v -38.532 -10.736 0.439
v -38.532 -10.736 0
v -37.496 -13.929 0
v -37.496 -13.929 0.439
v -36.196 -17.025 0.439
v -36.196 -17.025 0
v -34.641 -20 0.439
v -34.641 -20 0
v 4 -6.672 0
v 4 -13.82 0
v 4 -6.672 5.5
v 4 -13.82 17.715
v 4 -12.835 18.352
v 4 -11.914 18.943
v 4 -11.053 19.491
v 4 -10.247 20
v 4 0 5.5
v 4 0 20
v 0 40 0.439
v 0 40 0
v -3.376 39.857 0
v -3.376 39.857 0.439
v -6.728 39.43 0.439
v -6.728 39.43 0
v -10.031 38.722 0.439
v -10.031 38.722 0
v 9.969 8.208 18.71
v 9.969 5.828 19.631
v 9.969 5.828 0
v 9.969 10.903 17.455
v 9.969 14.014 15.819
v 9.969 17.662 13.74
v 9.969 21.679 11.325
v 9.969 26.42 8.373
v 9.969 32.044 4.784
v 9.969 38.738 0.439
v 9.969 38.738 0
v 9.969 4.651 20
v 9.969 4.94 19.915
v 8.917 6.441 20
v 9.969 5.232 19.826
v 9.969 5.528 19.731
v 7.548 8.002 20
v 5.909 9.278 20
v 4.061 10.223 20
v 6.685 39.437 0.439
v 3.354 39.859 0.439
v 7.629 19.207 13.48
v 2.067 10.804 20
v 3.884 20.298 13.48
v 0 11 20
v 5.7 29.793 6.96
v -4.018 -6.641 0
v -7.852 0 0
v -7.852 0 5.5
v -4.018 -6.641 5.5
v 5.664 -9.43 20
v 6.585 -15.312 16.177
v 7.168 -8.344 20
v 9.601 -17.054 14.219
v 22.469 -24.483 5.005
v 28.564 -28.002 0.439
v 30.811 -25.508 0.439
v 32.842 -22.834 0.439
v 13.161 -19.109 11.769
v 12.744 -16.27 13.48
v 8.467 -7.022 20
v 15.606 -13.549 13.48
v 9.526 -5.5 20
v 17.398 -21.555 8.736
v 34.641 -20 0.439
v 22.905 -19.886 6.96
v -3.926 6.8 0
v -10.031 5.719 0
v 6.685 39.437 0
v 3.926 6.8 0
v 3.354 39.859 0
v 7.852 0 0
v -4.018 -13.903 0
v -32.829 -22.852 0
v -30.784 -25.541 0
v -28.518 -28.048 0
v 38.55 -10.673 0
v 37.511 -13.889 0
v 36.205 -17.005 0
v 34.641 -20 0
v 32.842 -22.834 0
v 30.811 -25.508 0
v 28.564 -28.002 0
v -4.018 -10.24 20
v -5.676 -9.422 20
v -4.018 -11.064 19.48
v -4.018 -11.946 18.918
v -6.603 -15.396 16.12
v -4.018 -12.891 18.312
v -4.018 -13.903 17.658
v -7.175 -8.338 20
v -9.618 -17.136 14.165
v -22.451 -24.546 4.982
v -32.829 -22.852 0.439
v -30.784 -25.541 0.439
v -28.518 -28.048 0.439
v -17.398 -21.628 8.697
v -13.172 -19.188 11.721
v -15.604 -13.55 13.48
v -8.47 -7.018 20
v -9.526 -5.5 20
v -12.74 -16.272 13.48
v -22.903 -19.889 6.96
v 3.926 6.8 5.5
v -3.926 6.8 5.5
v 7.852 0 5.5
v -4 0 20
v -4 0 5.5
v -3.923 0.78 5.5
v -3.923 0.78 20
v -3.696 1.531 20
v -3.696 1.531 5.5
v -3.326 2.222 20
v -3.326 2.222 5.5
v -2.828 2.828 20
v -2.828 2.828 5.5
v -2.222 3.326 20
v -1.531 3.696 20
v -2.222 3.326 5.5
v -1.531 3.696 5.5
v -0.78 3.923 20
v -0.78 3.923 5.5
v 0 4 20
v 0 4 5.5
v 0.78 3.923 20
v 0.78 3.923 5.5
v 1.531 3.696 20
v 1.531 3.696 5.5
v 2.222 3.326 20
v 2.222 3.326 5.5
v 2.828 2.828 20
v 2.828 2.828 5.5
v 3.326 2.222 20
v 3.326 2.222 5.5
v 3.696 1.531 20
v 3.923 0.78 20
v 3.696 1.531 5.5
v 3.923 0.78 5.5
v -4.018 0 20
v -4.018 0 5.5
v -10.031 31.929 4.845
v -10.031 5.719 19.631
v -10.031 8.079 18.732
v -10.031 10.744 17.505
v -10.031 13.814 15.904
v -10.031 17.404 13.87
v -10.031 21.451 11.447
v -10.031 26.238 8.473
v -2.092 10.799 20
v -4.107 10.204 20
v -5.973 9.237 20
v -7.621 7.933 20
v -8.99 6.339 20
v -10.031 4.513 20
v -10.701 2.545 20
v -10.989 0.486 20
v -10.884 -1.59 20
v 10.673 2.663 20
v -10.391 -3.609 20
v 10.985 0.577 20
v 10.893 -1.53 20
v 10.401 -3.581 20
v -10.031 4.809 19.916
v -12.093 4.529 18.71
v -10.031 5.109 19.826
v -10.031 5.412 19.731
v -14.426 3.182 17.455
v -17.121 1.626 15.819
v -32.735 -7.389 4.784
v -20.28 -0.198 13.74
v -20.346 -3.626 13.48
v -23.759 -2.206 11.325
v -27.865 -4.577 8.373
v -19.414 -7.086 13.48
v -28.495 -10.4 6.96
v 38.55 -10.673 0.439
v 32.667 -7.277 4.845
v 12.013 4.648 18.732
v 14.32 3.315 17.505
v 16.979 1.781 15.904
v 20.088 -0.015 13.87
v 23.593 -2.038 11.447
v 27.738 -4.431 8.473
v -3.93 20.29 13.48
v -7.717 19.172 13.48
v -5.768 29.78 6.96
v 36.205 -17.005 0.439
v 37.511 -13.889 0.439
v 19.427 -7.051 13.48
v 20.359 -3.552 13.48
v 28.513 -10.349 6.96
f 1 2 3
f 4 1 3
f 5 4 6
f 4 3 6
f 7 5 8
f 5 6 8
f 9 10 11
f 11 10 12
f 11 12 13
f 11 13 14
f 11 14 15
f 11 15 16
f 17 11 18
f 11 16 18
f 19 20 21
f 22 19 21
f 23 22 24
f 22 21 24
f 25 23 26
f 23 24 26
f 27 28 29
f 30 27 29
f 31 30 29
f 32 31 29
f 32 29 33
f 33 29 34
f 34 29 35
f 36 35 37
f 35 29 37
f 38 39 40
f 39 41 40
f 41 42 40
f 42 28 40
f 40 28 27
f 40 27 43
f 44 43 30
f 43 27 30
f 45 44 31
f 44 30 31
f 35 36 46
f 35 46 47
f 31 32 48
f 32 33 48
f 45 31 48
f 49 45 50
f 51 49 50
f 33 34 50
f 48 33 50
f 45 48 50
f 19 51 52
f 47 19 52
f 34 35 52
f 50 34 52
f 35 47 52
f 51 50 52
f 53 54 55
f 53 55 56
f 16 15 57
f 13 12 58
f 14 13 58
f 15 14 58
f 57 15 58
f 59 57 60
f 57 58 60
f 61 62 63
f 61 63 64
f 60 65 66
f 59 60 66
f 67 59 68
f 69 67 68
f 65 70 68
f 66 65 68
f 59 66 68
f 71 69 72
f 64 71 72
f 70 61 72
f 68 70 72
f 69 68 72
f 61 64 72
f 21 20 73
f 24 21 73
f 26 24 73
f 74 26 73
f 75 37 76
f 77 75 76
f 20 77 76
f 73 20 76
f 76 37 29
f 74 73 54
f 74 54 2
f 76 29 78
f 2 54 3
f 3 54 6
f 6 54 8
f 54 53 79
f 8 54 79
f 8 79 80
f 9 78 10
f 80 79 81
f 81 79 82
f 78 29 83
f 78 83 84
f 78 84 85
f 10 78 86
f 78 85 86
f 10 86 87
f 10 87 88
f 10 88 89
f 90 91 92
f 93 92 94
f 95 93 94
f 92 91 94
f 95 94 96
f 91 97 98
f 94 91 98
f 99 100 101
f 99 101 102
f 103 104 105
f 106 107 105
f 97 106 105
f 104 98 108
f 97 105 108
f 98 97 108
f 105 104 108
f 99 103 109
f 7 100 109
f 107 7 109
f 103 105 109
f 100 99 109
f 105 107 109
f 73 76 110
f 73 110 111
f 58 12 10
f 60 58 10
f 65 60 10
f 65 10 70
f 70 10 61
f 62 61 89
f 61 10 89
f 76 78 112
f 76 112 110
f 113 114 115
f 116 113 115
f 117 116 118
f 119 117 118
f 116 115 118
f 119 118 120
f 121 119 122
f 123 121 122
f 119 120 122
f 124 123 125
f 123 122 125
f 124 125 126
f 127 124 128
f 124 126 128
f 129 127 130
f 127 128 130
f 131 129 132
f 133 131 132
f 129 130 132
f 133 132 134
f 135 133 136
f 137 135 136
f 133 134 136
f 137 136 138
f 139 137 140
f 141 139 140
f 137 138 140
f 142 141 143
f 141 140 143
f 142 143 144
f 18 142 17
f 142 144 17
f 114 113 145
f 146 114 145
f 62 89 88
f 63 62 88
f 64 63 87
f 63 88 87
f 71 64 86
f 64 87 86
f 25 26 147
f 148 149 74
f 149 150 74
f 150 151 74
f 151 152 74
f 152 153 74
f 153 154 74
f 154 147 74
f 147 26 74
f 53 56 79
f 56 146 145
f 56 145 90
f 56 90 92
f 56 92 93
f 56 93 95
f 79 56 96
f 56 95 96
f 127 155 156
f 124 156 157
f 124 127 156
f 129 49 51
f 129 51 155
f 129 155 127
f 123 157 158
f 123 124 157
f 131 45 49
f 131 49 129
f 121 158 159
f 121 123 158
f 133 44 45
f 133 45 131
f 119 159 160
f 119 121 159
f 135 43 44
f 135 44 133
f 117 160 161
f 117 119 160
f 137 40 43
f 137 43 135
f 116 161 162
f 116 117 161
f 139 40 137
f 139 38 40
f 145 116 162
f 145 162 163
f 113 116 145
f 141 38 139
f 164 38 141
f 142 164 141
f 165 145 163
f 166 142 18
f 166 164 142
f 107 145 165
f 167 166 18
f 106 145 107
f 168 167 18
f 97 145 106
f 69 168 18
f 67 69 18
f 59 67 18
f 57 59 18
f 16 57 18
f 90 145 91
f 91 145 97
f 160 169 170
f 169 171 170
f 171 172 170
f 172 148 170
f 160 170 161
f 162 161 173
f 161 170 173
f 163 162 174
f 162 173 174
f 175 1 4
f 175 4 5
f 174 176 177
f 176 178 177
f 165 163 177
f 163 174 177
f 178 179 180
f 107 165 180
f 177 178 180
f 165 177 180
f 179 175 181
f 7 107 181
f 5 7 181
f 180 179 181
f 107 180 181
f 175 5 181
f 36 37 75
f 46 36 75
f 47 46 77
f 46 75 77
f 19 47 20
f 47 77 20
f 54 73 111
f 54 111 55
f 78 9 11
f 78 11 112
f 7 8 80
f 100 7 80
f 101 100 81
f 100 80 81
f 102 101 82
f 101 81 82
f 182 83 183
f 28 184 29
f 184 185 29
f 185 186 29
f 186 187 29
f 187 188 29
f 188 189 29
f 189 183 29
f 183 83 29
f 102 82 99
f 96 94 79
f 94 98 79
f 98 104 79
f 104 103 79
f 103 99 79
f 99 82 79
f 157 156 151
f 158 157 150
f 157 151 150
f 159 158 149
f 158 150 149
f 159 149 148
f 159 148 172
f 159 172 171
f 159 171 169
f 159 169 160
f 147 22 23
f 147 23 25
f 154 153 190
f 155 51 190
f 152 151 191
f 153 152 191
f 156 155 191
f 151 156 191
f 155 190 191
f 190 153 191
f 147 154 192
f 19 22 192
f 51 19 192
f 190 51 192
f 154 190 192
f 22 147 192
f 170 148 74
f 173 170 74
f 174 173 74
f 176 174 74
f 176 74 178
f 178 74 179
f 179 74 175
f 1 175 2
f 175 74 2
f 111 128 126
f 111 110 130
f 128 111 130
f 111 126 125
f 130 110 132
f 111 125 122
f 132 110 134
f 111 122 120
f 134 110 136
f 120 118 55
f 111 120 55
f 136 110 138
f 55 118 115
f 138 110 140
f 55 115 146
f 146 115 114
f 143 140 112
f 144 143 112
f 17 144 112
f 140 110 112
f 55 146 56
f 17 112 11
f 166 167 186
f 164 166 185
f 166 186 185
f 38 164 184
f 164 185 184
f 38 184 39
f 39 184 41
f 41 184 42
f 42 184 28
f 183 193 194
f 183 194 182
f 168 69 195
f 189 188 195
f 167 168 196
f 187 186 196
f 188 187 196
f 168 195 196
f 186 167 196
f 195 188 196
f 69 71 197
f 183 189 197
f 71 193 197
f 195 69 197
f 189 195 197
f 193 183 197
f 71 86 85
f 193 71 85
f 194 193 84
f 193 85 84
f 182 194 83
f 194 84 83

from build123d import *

# Parameters (mm, degrees)
F1_DEPTH = 20
F2_DEPTH = 5.5
F3_SIZE2 = 19.5607469884
F3_SIZE  = 29
F4_COUNT = 3
F6_DEPTH = 20


with BuildPart() as f1:
    # F0 (on Top) → F1 (new body)
    with BuildSketch(Plane.XY):
        with BuildLine():
            ThreePointArc((-4, 0), (0, 4), (4, 0))
            Line((4, 0), (7.851963661, 0))
            Line((7.851963661, 0), (3.9259818305, 6.8))
            Line((3.9259818305, 6.8), (-3.9259818305, 6.8))
            Line((-3.9259818305, 6.8), (-7.851963661, 0))
            Line((-7.851963661, 0), (-4, 0))
        make_face()
        with BuildLine():
            Line((3.9259818305, 6.8), (7.851963661, 0))
            Line((7.851963661, 0), (9.96856343, 0))
            Line((9.96856343, 0), (9.96856343, 38.7379367435))
            ThreePointArc((9.96856343, 38.7379367435), (5.024068581, 39.6832298949), (-4.8e-09, 40))
            ThreePointArc((-4.8e-09, 40), (-5.0562773626, 39.6791388419), (-10.03143657, 38.7217029628))
            Line((-10.03143657, 38.7217029628), (-10.03143657, 0))
            Line((-10.03143657, 0), (-7.851963661, 0))
            Line((-7.851963661, 0), (-3.9259818305, 6.8))
            Line((-3.9259818305, 6.8), (3.9259818305, 6.8))
        make_face()
    extrude(amount=F1_DEPTH)

    # F0 (on Top) → F2 (cut)
    with BuildSketch(Plane.XY):
        with BuildLine():
            Line((7.851963661, 0), (4, 0))
            ThreePointArc((4, 0), (0, -4), (-4, 0))
            Line((-4, 0), (-7.851963661, 0))
            Line((-7.851963661, 0), (-3.9259818305, -6.8))
            Line((-3.9259818305, -6.8), (3.9259818305, -6.8))
            Line((3.9259818305, -6.8), (7.851963661, 0))
        make_face()
        with BuildLine():
            ThreePointArc((-4, 0), (0, 4), (4, 0))
            Line((4, 0), (7.851963661, 0))
            Line((7.851963661, 0), (3.9259818305, 6.8))
            Line((3.9259818305, 6.8), (-3.9259818305, 6.8))
            Line((-3.9259818305, 6.8), (-7.851963661, 0))
            Line((-7.851963661, 0), (-4, 0))
        make_face()
    extrude(amount=F2_DEPTH, mode=Mode.SUBTRACT)

    # F3
    f3_edges = [f1.edges().sort_by_distance(p)[0] for p in [
        (-0.032468, 39.999987, 20),
    ]]
    f3_side = f1.faces().sort_by_distance((-0.031771, 20.384779, 20))[0]
    chamfer(f3_edges, length=F3_SIZE, length2=F3_SIZE2, reference=f3_side)

    # F4: F1 ×3 about axis
    f4_axis = Axis((0, 0, 0.4392530116), (0, 0, -1))


with BuildPart() as f1_1:
    add(f1.part)
    for i in range(1, F4_COUNT):
        add(f1.part.rotate(f4_axis, i * 360 / F4_COUNT))

    # F5 (on face) → F6 (cut, through all)
    with BuildSketch(Plane.XY.offset(20)):
        with BuildLine():
            Line((4, -10.246950766), (4, 0))
            ThreePointArc((4, 0), (0, -4), (-4, 0))
            Line((-4, 0), (-4.017717205, 0))
            Line((-4.017717205, 0), (-4.017717205, -10.2400170147))
            ThreePointArc((-4.017717205, -10.2400170147), (-2.5130421152, -10.7090904995), (-0.9567753703, -10.9583110419))
            ThreePointArc((-0.9567753703, -10.9583110419), (1.5626299617, -10.8884428456), (4, -10.246950766))
        make_face()
        with BuildLine():
            Line((4, -15.0901665911), (4, -10.246950766))
            ThreePointArc((4, -10.246950766), (1.5626299617, -10.8884428456), (-0.9567753703, -10.9583110419))
            ThreePointArc((-0.9567753703, -10.9583110419), (-2.5130421152, -10.7090904995), (-4.017717205, -10.2400170147))
            Line((-4.017717205, -10.2400170147), (-4.017717205, -15.0901665911))
            Line((-4.017717205, -15.0901665911), (4, -15.0901665911))
        make_face()
    extrude(amount=-F6_DEPTH, mode=Mode.SUBTRACT)


solid = f1_1.part
